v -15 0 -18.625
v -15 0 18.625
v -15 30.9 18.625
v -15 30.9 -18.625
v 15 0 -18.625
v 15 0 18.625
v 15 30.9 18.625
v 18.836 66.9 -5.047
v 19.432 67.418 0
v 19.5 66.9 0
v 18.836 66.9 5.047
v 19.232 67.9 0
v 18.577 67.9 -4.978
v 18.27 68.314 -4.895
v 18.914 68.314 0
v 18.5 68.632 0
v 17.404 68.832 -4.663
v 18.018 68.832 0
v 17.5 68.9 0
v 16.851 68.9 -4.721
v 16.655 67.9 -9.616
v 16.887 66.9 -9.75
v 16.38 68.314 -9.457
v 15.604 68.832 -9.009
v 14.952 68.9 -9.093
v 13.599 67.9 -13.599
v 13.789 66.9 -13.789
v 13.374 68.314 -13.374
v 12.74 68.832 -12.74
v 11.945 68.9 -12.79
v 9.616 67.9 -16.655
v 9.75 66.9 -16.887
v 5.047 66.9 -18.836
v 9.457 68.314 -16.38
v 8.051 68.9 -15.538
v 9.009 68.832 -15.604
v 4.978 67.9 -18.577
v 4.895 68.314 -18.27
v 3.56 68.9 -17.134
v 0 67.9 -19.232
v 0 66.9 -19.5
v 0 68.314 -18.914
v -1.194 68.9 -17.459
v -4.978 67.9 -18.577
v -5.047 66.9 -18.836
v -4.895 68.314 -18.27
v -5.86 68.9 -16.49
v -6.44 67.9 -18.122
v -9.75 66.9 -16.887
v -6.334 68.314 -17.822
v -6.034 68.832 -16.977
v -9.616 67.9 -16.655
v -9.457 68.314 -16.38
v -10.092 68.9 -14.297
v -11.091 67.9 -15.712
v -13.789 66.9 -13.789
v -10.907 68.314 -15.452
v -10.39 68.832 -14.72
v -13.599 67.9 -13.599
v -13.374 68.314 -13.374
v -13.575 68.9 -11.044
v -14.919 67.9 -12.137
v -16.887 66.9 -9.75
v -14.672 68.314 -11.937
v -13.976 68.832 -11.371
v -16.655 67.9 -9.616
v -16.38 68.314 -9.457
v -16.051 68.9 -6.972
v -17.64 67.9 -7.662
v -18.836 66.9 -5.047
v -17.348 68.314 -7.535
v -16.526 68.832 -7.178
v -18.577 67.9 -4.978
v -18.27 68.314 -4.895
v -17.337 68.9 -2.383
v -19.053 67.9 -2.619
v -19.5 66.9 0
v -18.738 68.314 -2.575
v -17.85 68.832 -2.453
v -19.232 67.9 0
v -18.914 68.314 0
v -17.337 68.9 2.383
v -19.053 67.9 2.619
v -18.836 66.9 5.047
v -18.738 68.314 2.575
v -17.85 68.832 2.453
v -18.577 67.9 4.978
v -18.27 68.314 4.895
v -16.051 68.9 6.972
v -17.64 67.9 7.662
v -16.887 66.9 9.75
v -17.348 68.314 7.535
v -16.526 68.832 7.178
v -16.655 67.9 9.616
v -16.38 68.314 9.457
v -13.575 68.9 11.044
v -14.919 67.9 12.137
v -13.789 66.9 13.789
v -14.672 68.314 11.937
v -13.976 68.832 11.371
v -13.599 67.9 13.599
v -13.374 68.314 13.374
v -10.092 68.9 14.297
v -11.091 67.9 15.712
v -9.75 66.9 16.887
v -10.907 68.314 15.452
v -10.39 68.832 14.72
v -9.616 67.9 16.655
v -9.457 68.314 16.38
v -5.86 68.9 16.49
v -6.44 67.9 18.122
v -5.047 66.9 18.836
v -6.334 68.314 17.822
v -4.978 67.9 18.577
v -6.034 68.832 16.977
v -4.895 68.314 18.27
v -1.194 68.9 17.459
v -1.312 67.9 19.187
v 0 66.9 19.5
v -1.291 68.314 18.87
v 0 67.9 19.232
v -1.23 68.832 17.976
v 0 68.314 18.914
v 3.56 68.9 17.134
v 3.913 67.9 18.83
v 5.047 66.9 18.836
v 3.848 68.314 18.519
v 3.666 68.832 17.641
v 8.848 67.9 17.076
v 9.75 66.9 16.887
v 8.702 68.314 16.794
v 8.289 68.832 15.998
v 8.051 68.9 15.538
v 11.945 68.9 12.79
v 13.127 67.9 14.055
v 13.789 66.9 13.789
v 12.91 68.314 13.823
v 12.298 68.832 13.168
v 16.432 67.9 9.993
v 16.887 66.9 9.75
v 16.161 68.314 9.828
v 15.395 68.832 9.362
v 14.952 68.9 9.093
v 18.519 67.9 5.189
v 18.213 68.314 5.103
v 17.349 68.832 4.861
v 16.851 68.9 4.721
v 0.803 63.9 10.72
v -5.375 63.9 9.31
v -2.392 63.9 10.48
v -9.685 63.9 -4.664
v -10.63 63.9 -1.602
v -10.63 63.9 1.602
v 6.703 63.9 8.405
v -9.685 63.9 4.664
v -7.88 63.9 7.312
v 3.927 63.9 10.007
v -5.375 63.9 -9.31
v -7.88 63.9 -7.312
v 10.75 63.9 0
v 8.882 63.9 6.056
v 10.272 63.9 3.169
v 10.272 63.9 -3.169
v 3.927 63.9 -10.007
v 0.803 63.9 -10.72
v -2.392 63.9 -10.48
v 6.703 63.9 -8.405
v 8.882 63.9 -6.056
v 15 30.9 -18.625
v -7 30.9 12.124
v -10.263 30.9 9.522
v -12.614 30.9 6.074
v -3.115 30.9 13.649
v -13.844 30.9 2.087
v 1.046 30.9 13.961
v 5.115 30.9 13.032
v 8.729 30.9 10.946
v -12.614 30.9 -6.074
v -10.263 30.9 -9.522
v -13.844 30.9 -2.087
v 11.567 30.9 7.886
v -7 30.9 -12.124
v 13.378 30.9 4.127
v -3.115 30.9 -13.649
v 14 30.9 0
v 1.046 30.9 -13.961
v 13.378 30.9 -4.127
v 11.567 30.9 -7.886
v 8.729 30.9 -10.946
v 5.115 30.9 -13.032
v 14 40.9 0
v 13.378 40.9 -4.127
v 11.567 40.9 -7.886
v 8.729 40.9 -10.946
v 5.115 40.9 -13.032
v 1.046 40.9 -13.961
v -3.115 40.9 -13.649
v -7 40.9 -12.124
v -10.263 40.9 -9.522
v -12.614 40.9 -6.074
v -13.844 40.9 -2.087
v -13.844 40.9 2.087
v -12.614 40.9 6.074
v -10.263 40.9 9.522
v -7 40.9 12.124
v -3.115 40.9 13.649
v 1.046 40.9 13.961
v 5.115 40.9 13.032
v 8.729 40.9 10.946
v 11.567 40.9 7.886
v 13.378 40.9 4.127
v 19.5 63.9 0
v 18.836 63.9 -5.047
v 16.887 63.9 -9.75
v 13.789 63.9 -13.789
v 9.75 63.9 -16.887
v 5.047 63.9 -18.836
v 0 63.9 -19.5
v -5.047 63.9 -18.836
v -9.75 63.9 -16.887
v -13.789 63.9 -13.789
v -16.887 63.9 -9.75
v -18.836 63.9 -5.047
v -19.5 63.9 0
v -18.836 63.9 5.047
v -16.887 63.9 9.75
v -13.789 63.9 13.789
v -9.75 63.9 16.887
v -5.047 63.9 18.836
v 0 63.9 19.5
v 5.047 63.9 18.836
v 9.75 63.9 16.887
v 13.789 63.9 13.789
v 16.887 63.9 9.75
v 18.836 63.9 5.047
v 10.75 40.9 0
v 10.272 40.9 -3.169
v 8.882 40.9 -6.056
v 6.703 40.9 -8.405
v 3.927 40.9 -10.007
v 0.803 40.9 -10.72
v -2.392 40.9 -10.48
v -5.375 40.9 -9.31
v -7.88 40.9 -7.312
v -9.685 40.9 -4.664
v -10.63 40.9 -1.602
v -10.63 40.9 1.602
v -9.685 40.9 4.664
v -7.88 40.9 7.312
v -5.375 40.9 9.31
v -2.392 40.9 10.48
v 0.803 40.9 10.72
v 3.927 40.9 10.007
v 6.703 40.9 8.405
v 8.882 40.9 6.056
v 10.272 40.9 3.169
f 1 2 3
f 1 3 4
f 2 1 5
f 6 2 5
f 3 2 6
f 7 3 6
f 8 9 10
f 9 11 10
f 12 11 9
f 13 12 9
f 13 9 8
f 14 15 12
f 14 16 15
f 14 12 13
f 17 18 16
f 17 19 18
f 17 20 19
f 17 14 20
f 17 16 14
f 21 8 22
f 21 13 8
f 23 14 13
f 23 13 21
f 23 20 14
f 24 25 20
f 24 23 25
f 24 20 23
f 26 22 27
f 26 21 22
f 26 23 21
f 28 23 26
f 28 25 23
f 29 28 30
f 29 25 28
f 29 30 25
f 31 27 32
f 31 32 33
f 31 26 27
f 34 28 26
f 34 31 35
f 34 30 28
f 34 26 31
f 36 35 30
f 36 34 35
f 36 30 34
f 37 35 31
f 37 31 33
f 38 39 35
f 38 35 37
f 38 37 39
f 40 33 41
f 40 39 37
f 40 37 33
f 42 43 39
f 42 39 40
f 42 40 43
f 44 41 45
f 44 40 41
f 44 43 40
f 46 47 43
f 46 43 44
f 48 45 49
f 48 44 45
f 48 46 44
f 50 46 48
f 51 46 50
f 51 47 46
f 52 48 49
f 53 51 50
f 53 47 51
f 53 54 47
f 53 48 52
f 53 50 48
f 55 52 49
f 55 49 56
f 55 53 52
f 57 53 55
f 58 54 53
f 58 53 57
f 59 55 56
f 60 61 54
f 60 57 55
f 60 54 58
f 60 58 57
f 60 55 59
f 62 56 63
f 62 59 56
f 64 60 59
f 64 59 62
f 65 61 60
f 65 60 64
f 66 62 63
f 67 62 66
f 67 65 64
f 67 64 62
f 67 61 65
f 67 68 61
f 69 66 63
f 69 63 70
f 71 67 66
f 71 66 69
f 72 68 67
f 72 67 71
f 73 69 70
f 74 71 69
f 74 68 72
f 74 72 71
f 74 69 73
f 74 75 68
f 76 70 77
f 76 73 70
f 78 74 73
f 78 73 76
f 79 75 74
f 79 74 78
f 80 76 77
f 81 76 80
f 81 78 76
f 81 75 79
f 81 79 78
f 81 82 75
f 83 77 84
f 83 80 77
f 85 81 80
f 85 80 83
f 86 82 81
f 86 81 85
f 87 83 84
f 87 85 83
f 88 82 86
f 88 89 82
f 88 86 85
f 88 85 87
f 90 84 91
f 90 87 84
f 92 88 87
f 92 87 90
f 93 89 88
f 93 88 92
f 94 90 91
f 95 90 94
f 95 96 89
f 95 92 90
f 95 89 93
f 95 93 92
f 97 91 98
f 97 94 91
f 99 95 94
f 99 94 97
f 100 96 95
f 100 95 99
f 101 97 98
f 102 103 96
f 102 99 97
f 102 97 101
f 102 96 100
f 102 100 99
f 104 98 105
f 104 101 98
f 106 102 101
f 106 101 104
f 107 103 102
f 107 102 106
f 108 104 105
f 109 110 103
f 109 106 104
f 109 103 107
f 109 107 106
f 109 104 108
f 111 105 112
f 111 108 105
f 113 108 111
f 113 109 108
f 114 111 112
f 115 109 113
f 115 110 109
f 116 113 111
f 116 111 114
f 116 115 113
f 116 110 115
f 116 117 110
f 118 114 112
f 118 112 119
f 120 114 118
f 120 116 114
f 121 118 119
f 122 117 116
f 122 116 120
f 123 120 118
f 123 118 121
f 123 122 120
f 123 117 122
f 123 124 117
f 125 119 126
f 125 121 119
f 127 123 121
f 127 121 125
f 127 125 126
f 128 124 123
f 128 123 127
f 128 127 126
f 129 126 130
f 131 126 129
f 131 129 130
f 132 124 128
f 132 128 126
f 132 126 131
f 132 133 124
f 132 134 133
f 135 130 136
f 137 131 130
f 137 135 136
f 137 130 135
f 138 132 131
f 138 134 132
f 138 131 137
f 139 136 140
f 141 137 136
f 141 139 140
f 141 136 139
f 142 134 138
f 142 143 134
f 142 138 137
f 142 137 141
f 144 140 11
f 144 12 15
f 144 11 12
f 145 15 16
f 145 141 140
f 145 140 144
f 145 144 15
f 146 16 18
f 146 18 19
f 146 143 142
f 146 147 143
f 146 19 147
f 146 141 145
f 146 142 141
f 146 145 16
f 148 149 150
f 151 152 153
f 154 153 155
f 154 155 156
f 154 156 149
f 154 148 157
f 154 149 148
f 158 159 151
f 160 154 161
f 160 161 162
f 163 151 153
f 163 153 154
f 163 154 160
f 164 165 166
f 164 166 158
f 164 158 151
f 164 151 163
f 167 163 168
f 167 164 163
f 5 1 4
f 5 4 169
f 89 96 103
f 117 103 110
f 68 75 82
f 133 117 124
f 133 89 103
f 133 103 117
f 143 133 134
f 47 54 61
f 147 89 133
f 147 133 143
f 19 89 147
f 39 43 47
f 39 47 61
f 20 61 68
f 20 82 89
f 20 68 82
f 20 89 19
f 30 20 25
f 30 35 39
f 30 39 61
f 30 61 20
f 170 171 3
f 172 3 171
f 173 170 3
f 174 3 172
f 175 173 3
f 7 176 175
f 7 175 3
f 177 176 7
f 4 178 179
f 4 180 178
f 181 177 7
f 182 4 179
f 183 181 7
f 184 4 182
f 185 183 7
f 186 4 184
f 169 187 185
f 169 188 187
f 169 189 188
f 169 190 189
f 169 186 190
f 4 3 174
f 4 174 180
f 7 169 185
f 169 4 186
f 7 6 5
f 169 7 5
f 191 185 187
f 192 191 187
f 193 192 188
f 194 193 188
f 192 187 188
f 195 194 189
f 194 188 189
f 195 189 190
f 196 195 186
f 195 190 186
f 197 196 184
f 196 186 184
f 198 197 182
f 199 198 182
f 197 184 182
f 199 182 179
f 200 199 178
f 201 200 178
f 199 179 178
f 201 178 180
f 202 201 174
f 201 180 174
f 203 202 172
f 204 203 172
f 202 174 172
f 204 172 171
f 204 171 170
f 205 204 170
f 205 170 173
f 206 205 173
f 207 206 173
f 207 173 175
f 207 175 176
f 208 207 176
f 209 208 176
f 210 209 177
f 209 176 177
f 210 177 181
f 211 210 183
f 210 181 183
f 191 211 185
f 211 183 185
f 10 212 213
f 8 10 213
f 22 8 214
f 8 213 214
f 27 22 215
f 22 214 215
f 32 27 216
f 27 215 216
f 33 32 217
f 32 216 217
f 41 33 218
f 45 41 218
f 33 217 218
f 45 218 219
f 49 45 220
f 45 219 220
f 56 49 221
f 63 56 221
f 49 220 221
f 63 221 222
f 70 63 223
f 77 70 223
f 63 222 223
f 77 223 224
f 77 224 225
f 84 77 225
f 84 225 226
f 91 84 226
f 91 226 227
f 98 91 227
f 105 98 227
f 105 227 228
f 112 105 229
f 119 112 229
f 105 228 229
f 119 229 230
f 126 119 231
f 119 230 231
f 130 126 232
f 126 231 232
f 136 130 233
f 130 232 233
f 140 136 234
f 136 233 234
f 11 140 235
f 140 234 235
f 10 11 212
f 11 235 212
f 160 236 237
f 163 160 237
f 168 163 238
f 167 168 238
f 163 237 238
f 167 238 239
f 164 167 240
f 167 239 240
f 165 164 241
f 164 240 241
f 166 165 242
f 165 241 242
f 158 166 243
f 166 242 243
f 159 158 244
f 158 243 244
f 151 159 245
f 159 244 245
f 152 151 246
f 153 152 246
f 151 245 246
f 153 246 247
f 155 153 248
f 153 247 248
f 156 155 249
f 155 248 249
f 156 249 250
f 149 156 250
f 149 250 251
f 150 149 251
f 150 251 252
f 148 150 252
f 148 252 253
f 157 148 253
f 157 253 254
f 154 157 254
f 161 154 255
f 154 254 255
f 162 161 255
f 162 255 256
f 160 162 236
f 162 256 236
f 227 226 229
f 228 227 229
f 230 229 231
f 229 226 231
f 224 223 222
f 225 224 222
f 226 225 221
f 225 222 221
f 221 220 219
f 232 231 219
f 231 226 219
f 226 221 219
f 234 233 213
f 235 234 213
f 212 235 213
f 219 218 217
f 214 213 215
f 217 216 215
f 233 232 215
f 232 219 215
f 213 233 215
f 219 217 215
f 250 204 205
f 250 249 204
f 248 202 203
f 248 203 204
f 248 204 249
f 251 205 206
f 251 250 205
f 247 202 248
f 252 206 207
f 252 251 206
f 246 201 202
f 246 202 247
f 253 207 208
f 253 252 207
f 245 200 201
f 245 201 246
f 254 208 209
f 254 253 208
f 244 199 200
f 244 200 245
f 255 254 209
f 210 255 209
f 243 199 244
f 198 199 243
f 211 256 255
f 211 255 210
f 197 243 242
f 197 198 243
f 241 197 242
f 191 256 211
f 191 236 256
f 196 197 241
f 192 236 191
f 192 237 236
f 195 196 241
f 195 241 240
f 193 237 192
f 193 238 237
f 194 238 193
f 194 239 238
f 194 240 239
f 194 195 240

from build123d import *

# Parameters (mm, degrees)
SKETCH1_W           = 30
SKETCH1_H           = 37.25
BOSS_EXTRUDE1_DEPTH = 30.9
SKETCH2_R           = 14
BOSS_EXTRUDE2_DEPTH = 10
SKETCH3_R           = 10.75
BOSS_EXTRUDE3_DEPTH = 23
SKETCH4_R           = 19.5
BOSS_EXTRUDE4_DEPTH = 5
FILLET1_R           = 2


with BuildPart() as part:
    # Sketch1 → Boss-Extrude1 (new body)
    with BuildSketch(Plane(origin=(0, 0, 0), x_dir=(1, 0, 0), z_dir=(0, 1, 0))):
        Rectangle(SKETCH1_W, SKETCH1_H)
    extrude(amount=BOSS_EXTRUDE1_DEPTH)

    # Sketch2 → Boss-Extrude2 (add)
    with BuildSketch(Plane(origin=(0, 30.9, 0), x_dir=(1, 0, 0), z_dir=(0, 1, 0))):
        Circle(SKETCH2_R)
    extrude(amount=BOSS_EXTRUDE2_DEPTH)

    # Sketch3 → Boss-Extrude3 (add)
    with BuildSketch(Plane(origin=(0, 40.9, 0), x_dir=(1, 0, 0), z_dir=(0, 1, 0))):
        Circle(SKETCH3_R)
    extrude(amount=BOSS_EXTRUDE3_DEPTH)


with BuildPart() as body_2:
    # Sketch4 → Boss-Extrude4 (new body)
    with BuildSketch(Plane(origin=(0, 63.9, 0), x_dir=(1, 0, 0), z_dir=(0, 1, 0))):
        Circle(SKETCH4_R)
    extrude(amount=BOSS_EXTRUDE4_DEPTH)

    # Fillet1
    fillet1_edges = [body_2.edges().sort_by_distance(p)[0] for p in [
        (-19.5, 68.9, 0),
    ]]
    fillet(fillet1_edges, radius=FILLET1_R)


solid = Compound([part.part, body_2.part])
